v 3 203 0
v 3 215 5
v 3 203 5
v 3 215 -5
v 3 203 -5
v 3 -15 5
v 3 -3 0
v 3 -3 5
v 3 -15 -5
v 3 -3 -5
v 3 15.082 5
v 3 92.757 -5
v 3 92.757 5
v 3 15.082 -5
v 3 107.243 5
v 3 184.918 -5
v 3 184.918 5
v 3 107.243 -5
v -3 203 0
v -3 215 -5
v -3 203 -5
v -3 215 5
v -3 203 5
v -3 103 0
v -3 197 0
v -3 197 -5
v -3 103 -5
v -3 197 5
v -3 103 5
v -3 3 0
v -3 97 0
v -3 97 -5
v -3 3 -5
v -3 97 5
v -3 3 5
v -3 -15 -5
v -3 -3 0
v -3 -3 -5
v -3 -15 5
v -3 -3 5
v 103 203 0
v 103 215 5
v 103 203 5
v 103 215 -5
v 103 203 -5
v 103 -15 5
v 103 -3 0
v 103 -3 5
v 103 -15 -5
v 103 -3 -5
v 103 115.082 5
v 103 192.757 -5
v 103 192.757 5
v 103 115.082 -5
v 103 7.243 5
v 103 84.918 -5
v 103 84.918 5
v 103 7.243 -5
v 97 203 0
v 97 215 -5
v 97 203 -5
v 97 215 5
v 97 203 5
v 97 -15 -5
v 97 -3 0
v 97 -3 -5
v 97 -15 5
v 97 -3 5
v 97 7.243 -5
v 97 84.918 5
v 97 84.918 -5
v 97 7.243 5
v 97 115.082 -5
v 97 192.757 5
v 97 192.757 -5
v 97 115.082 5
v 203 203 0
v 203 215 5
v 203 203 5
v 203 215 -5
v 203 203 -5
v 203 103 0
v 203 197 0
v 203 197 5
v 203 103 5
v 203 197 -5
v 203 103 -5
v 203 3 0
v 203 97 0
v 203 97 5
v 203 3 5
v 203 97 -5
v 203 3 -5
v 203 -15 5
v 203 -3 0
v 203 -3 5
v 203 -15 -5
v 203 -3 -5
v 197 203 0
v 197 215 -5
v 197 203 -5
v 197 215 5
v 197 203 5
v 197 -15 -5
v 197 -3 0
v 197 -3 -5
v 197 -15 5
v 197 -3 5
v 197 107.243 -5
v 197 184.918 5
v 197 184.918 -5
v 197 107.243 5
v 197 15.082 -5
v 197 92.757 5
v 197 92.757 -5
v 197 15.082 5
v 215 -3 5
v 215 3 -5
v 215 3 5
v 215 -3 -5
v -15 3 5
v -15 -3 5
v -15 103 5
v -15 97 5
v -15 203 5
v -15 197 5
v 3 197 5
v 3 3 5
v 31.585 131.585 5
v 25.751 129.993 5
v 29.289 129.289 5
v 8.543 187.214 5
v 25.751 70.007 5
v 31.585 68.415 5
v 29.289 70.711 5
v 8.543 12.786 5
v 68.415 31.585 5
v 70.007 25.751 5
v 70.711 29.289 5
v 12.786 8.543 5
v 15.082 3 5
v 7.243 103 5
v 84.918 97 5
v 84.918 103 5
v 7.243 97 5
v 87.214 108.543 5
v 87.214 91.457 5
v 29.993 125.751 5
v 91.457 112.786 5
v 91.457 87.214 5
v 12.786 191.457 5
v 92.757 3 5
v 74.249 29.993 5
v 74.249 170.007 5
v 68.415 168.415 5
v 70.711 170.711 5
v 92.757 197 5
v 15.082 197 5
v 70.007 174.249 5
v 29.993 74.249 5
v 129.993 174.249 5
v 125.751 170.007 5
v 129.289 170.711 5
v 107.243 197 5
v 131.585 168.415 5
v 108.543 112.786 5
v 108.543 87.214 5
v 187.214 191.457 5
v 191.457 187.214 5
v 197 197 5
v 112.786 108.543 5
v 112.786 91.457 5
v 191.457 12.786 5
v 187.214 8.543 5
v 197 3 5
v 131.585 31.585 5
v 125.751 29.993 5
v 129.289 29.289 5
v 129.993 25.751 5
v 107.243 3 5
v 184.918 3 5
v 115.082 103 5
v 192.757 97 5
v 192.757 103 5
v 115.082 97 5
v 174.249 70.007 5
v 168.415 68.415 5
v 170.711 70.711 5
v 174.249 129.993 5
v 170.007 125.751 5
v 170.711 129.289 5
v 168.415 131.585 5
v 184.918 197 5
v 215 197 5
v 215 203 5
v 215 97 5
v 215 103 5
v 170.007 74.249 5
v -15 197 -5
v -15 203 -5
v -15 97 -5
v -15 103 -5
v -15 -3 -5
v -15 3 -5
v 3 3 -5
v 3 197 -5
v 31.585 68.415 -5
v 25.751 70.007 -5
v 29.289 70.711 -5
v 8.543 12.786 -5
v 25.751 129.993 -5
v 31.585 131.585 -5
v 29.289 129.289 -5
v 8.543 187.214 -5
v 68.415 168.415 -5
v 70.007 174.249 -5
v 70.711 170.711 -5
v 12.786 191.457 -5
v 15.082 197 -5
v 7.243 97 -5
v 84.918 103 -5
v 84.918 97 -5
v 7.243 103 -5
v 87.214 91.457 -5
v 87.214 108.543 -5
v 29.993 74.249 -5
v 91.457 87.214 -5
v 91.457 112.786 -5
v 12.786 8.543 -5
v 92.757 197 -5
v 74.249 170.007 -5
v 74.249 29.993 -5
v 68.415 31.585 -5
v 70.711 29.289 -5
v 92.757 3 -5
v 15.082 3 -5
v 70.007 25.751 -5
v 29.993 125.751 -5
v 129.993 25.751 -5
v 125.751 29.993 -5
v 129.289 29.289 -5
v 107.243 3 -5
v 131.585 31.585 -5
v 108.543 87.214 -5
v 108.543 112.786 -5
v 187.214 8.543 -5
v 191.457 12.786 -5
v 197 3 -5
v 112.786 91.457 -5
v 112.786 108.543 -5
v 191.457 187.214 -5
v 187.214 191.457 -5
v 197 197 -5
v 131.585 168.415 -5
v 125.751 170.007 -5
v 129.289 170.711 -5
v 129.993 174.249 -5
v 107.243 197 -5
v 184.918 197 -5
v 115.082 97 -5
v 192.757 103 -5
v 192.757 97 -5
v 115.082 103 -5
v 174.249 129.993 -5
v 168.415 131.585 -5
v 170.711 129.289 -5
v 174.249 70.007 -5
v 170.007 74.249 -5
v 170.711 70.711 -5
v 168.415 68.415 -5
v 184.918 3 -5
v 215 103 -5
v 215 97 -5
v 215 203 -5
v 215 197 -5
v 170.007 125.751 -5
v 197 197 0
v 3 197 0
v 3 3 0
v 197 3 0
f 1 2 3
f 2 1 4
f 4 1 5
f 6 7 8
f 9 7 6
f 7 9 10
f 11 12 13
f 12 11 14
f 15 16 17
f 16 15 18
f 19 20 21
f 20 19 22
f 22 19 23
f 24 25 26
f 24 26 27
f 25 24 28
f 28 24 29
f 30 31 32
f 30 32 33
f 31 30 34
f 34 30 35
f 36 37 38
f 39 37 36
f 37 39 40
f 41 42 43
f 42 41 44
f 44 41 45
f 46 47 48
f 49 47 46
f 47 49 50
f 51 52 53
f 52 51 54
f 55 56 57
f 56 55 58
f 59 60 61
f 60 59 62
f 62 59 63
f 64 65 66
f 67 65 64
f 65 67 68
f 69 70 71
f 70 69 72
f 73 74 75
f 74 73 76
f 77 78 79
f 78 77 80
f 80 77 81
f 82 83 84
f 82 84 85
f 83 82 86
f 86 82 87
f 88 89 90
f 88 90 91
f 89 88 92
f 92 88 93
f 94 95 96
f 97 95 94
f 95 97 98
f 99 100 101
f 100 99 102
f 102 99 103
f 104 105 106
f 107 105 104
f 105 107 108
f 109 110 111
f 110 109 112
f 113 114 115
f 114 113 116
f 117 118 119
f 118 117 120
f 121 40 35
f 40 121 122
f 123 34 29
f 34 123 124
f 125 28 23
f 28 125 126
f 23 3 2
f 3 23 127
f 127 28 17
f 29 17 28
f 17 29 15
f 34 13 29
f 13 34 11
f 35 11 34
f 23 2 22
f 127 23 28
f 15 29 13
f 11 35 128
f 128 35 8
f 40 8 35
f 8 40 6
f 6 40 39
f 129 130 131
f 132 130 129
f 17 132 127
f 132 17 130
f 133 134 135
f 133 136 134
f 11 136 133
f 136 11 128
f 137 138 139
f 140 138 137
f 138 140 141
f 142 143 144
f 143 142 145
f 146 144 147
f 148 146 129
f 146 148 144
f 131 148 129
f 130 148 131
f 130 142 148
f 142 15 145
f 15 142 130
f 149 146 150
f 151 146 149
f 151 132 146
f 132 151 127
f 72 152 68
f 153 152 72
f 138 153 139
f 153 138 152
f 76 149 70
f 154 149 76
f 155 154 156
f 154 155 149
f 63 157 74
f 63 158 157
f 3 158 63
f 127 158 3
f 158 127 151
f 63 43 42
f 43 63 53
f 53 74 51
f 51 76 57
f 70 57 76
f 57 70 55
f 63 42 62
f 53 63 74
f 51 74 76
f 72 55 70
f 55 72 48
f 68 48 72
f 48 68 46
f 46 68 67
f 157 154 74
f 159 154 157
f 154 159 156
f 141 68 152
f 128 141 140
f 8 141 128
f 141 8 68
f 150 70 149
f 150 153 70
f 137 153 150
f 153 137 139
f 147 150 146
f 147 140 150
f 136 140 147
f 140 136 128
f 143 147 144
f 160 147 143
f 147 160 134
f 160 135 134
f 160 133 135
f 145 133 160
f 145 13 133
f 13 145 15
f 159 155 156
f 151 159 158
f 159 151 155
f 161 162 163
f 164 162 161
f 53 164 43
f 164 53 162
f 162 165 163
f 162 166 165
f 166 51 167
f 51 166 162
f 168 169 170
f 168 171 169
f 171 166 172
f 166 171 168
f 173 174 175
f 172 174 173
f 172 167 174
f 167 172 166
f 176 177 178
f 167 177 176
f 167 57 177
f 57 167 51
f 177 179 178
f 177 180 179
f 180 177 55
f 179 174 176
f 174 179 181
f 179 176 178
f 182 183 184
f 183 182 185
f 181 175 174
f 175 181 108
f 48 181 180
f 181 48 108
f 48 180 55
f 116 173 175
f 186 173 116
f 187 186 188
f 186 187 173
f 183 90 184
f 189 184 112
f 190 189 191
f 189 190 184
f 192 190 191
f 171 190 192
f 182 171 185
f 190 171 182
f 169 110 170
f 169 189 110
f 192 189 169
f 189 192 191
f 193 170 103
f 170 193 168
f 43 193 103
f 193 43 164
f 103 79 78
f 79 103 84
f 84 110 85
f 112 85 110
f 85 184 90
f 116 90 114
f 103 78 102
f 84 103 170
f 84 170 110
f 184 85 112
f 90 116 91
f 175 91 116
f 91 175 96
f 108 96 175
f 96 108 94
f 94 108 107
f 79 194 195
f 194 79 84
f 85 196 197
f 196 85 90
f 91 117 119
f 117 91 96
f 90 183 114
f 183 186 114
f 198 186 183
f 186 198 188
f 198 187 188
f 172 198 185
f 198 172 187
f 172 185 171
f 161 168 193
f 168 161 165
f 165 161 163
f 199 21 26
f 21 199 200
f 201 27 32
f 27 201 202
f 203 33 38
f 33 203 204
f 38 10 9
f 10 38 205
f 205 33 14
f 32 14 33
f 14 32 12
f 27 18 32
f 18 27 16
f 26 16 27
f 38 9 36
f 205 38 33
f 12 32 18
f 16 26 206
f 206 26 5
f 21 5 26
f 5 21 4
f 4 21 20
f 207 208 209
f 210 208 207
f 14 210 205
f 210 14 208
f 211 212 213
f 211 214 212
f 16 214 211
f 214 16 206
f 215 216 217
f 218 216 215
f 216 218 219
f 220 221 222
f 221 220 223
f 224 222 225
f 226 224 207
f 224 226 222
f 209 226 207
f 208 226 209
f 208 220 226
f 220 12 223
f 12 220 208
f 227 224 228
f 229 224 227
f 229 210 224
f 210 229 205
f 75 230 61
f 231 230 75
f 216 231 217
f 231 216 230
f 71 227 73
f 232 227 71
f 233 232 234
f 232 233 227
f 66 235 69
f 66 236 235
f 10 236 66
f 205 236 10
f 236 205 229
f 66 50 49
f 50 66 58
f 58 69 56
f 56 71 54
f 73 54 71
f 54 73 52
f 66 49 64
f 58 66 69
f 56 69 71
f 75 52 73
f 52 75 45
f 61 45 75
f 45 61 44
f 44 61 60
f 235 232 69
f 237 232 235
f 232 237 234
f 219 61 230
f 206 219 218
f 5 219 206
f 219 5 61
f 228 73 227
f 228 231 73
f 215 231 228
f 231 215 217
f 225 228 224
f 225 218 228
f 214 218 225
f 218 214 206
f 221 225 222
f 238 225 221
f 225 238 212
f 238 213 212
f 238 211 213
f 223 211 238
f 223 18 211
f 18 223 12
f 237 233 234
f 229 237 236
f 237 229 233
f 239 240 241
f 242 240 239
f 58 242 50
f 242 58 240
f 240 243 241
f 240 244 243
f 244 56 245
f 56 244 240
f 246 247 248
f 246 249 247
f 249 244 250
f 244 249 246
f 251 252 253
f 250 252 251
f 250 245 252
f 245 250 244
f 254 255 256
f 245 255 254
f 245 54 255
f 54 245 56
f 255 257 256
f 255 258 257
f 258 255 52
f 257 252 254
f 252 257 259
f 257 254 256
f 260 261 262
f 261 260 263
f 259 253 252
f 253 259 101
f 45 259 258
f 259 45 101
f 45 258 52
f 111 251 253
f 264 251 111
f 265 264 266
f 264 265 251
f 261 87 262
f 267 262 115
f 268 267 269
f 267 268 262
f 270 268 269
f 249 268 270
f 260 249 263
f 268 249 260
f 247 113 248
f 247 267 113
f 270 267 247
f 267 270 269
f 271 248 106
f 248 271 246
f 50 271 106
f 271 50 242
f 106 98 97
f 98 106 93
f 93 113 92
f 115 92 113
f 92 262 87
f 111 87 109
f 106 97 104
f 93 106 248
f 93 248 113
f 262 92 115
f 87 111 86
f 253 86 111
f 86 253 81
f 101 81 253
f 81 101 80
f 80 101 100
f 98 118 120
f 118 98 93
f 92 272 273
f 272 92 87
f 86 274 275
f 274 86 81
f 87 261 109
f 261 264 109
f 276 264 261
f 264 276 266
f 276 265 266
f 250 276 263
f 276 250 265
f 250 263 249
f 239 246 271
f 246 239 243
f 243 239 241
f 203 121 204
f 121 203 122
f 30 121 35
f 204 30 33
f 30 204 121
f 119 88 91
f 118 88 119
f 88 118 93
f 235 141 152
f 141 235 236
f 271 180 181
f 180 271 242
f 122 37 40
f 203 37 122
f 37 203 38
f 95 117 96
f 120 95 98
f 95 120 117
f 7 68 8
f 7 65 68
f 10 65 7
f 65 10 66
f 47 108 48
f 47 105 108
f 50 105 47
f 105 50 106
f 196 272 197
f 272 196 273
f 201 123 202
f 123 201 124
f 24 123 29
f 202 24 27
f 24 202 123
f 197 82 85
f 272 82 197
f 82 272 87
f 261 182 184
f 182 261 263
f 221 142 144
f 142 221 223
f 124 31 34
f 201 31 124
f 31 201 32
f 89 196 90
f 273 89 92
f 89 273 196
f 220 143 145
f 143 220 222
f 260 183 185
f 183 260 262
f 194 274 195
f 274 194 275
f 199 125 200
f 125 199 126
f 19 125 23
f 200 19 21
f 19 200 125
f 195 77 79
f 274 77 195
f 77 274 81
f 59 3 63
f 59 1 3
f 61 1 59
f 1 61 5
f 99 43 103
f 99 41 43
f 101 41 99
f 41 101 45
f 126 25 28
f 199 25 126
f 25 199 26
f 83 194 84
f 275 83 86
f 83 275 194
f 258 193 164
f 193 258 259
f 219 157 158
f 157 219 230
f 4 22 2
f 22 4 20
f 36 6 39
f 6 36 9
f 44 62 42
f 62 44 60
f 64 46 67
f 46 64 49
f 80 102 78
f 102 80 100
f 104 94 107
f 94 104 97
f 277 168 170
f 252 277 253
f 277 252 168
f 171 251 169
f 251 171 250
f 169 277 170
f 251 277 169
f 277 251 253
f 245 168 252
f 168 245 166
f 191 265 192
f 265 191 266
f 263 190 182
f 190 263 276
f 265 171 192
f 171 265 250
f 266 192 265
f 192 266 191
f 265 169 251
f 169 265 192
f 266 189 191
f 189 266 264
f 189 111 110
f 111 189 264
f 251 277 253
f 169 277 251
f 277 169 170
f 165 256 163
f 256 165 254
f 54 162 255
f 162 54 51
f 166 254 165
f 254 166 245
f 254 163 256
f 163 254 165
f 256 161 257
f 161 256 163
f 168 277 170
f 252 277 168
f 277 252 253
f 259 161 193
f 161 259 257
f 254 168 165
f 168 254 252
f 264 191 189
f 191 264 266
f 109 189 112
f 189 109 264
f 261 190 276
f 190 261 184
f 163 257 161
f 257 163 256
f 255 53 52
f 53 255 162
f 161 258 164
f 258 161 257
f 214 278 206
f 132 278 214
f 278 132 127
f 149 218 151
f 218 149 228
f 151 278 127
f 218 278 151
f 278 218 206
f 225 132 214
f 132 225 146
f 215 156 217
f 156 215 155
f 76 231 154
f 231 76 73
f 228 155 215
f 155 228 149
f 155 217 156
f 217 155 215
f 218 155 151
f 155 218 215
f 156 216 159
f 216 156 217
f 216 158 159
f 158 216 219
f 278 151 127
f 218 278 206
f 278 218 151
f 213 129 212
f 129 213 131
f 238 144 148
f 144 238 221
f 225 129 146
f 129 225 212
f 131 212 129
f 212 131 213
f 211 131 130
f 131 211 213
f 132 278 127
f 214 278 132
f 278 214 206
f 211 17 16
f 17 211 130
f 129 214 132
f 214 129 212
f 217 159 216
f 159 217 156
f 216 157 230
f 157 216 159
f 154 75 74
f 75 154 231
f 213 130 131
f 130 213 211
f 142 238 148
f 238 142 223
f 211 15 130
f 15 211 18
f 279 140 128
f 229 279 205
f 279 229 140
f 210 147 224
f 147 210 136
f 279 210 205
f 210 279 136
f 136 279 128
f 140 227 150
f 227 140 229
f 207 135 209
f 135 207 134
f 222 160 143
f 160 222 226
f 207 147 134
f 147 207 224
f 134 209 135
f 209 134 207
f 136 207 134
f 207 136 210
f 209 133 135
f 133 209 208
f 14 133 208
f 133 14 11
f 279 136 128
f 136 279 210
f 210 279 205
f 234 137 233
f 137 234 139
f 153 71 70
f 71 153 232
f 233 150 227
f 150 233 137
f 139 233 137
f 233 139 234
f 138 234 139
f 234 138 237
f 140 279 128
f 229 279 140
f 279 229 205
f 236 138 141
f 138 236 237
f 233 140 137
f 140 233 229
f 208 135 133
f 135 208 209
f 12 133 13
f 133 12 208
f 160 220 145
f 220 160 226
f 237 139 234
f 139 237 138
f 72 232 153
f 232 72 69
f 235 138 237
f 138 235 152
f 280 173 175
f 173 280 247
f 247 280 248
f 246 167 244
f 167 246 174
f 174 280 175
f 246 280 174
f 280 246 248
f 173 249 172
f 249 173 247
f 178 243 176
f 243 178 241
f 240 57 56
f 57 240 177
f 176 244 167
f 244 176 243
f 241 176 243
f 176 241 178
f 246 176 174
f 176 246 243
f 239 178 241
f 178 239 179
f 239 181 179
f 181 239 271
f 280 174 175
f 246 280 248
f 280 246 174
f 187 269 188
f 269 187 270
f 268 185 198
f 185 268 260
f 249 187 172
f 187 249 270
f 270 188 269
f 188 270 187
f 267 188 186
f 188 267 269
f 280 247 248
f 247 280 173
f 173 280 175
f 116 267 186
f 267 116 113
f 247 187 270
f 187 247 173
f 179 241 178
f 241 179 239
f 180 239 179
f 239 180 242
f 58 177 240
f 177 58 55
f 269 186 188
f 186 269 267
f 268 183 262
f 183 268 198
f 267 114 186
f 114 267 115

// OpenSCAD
$l = 100;
$s = 6;
$h = 10;
$fn=30;
$extrude = true;
$colorit = true;

function measure(x) = sqrt(x*x);

module kolor(c) {
  if ($colorit) {
    color(c) children();
  } else {
    children();
  }
}

module maybe_extrude() {
  if ($extrude) {
    linear_extrude($h, center=true) {
      children();
    }
  } else {
    children();
  }
}

// Debugging, put a little dot at (x1, y1) offset by o
module _pp(p) {
  //  translate([x1 - cos(atan(l1) + 90)*o/2,
  //             y1 - sin(atan(l1) + 90)*o/2 ])
  echo(p);
  translate(p)
    color("black")circle(r=1);
}

module framer(n=1) {
  difference() {
    translate([-5/2 * $s, -1/2 * $s, -1/2 * $h]) {
      cube([n * $l + 5 * $s, $s, $h]);
    }
    for (i = [0 : n]) {
      translate([-1/2 * $s + i * $l, -1/2 * $s - .01, 0]) {
        cube([$s, $s + .02, 1/2 * $h + .01 ]);
      }
    }
  }
}

module frame(nx, ny) {
  for (j = [0 : ny]) {
    translate([0, j * $l, 0]) {
      kolor([.8, .8, .8]) {
        framer(nx);
      }
    }
  }
  for (i = [0 : nx]) {
    translate([i * $l, 0, 0]) {
      rotate(90) {
        scale([1, 1, -1]) {
          kolor([.9, .9, .9]) {
            framer(ny);
          }
        }
      }
    }
  }
}

// Where does the line passing through (x1, y1) with slope tan(a1)
// intersect the line passing through (x2, y2) with slope tan(a2)?
//
// The equation of a  line through x0, y0 with slope λ0 = tan(a0) is
//
// (Y - y0) / (X - x0) = λ0  ................................... [1]
//
// equivalently:
//
// Y = λ0 * (X - x0) + y0    ................................... [2]
//
//
// equivalently
//
// X = x0 + (Y - y0) / λ0    ................................... [3]


// The two lines intersect at:
//
// λ1 * (X - x1) + y1 = λ2 * (X - x2) + y2
//
// => λ1 * X - λ1 * x1 + y1 = λ2 * X - λ2 * x2 + y2
//
// => λ1 * X - λ2 * X = λ1 * x1 - y1 - λ2 * x2 + y2
//
// => (λ1 - λ2) * X = (λ1 * x1  - λ2 * x2) - (y1 - y2)
//
//
// X = ((λ1 * x1  - λ2 * x2) - (y1 - y2)) / (λ1 - λ2) .........  [4]
//
//
// Prettier:
//
//          (λ1 * x1  - λ2 * x2) - (y1 - y2)
//    X = ------------------------------------
//                      (λ1 - λ2)
//
//
// We can derive Y two ways:
//
// Substituting X from [4] into [2] for either line,
// or more elegantly by using [3]:
//
// x1 + (Y - y1) / λ1 = x2 + (Y - y2) / λ2
//
// => λ1 * λ2 * x1 + λ2 * Y - λ2 * y1 = λ2 * λ1 * x2 + λ1 * Y - λ1 * y2
//
// =>  λ1 * Y -  λ2 * Y = λ1 * λ2 * x1 -  λ1 * λ2 * x2 + λ2 * y1  - λ1 * y2
//
// => Y = (λ1 * λ2 * (x1 - x2) + λ1 * y2  - λ2 * y1) / (λ1 - λ2) .. [5]
//
//
// Prettier
//
//          λ1 * λ2 * (x1 - x2) + λ1 * y2  - λ2 * y1
//    Y = --------------------------------------------
//                       (λ1 - λ2)
//
//
//
// If line1 is vertical, intersection is at [x1, y2 - (x2 - x1) * λ2]
// If line2 is vertical, intersection is at [x2, y1 - (x1 - x2) * λ1]

function intersect_lines(x1, y1, a1, x2, y2, a2) =
  (abs(a1) == 90) ? [x1, y2 - (x2 - x1) * tan(a2)] :  // line1 is vertical
  (abs(a2) == 90) ? [x2, y1 - (x1 - x2) * tan(a1)] :  // line2 is vertical
                    [
                     ((tan(a1) * x1  - tan(a2) * x2) - (y1 - y2)) / (tan(a1) - tan(a2)),
                     (tan(a1) * tan(a2) * (x1 - x2) + tan(a1) * y2 - tan(a2) * y1) / (tan(a1) - tan(a2))
                     ];


// Our "lines" have thickness, so we need to intersect where the shifted
// lines meet
function intersect_lines_offset(x1, y1, a1, x2, y2, a2, o1, o2) =
  intersect_lines(x1 - cos(a1 + 90) * o1 / 2,
                  y1 - sin(a1 + 90) * o1 / 2,
                  a1,
                  x2 - cos(a2 + 90) * o2 / 2,
                  y2 - sin(a2 + 90) * o2 / 2,
                  a2);

function flip(x) = [x[1], x[0]];

//
//
//
//      Y                            xxxxxx
//      Y                             P
//      Y                           P  q
//      Y                         P   q
//      Y                       P    q
//      Y                     P     q
//      Y                   P      q
//      Y                 P       q
//      Y               P        q
//      Y             P         q
//      Y           P          Q
//      Y         P        Q    R
//      Y       P      Q          R
//      Y     P    Q                R   y
//      Y   P  Q                     R  y
//      Y PQ                           Ry
//       XXXXXXXXXXXXXXXXXXXXXXXXXXXXXXXXXXXXXXXXXXXXX
//
//
// X: (0, 0), 0°
// Y: (0, 0), 90°
// x: (l, l), 0°
// y: (l, 0), 90°
// P: (0, 0), 45°
// Q: (0, 0), 22.5°
// q: (l, l), -135° + 22.5°
// R: (l, 0), 135°


module quad(which="nothing") {
  LLx = 0;
  LLy = 0;
  LL  = [LLx, LLy];
  LL3 = [LLx, LLy, 0];
  LRx = $l;
  LRy = 0;
  LR  = [LRx, LRy];
  LR3 = [LRx, LRy, 0];
  ULx = 0;
  ULy = $l;
  UL = [ULx, ULy];
  UL3= [ULx, ULy, 0];
  URx = $l;
  URy = $l;
  UR  = [URx, URy];
  UR3 = [URx, URy, 0];

// Use symmetry where possible


  p0 = [$s / 2, $s / 2];
  p1 = intersect_lines_offset(LLx, LLy, 45, LLx, LLy, 22.5, $s, -$s);
  p2 = UR - flip(p1);
  p3 = UR - p0;
  p4 = flip(p2);
  p5 = flip(p1);

  module p() {
    maybe_extrude() {
      polygon(points=[p0, p1, p2, p3, p4, p5]);
    }
  }

  q0 = p0;
  q1 = intersect_lines_offset(LLx, LLy, 22.5, LLx, LLy, 0, $s, -$s);
  q2 = intersect_lines_offset(LLx, LLy, 22.5, LRx, LRy, 135, $s, -$s);
  q3 = intersect_lines_offset(LLx, LLy, 22.5, URx, URy, -135 + 22.5, 0, 0);
  q4 = intersect_lines_offset(LLx, LLy, 22.5, URx, URy, -135 + 22.5, -$s, $s);
  q5 = p1;

  module q() {
    maybe_extrude() {
      polygon(points=[q0, q1, q2, q3, q4, q5]);
    }
  }

  r0 = LR - [$s / 2, -$s / 2];
  r1 = intersect_lines_offset(LRx, LRy, 0, LRx, LRy, 135, -$s, -$s);
  r2 = q2;
  r3 = q3;
  r4 = UR - flip(r2);
  r5 = UR - flip(r1);

  module r() {
    maybe_extrude() {
      polygon(points=[r0, r1, r2, r3, r4, r5]);
    }
  }

  if (which == "p") {
    p();
  } else if (which == "q") {
    q();
  } else if (which == "r") {
    r();
  } else if (which == "qm") {
    mirror([1, -1]) q();
  } else {
    kolor("red") p();

    kolor("green") q();
    kolor("olive") translate(UR3) mirror([1, 1]) q();
    kolor("lime") translate(LL3) mirror([1, -1]) q();
    kolor("lightgreen") mirror([1, -1]) translate(UR3) mirror([1, 1]) q();

    kolor("blue") r();
    kolor("cyan") mirror([1, -1]) r();
  }
}



// Print 6 of this:
*framer(2);

// Print 4 of this:
*quad("p");

// Print 8 of each of these
*quad("q");
*quad("qm");
*quad("r");

// show
union() {
  x = 2;
  y = 2;

  frame(x, y);
  for (i = [1 : 2 : x], j = [1 : 2 : y]) {
    translate([$l * i, $l * j]) {
      for (a = [0 : 90 : 359]) {
        rotate(a) {
          quad();
        }
      }
    }
  }
}


module hex() {

  LLx = 0;
  LLy = 0;
  LL  = [LLx, LLy];
  LL3 = [LLx, LLy, 0];

  LRx = $l;
  LRy = 0;
  LR  = [LRx, LRy];
  LR3 = [LRx, LRy, 0];

  UUx = $l / 2;
  UUy = $l * sqrt(3) / 2;
  UU  = [UUx, UUy];
  UU3 = [UUx, UUy, 0];

  p0 = intersect_lines_offset(LLx, LLy, 0, LLx, LLy, 60, 0, 0);
  p1 = intersect_lines_offset(LLx, LLy, 0, LLx, LLy, 60, -$s, $s);
  p2 = [LRx - p1[0], p1[1]];
  p3 = LR;
  p4 = [p2[0], -p2[1]];
  p5 = [p1[0], -p1[1]];

  module p() {
    maybe_extrude() {
      polygon(points=[p0, p1, p2, p3, p4, p5]);
    }
  }

  module rota() {
    translate(LR) rotate(120) children();
  }

  module rotb() {
    translate(UU) rotate(240) children();
  }

  q0 = p1;
  q1 = intersect_lines_offset(LLx, LLy, 0, LLx, LLy, 30, -$s, $s);
  q2 = intersect_lines_offset(LLx, LLy, 30, LRx, LRy, 150, $s, -$s);
  q3 = intersect_lines_offset(LLx, LLy, 30, LRx, LRy, 150, 0, 0);
  q4 = intersect_lines_offset(LLx, LLy, 30, UUx, UUy, 90, -$s, -$s);
  q5 = intersect_lines_offset(LLx, LLy, 30, LLx, LLy, 60, -$s, $s);

  module q() {
    maybe_extrude() {
      polygon(points=[q0, q1, q2, q3, q4, q5]);
    }
  }

  f = LRx / 3;
  r0 = intersect_lines_offset(LLx, LLy, 0, f, LLy, 30, -$s, -$s);
  r1 = intersect_lines_offset(LLx, LLy, 0, f, LLy, 30, -$s, $s);
  r2 = intersect_lines_offset(LRx / 3, LLy, 30, LRx, LRy, 150, $s, -$s);
  r3 = intersect_lines_offset(LRx / 3, LLy, 30, LRx, LRy, 150, -$s, -$s);

  module x1() {
    if ($extrude) {
      difference() {
        linear_extrude($h, center=true) {
          polygon(points=[r0, r1, r2, r3]);
        }
        linear_extrude($h / 2) {
          translate(LR) {
            scale([-1, 1]) polygon(points=[r0, r1, r2, r3]);
          }
        }
      }
    } else {
      polygon(points=[r0, r1, r2, r3]);
    }
  }

  module x2() {
    translate(LR) {
      scale([-1, 1]) {
        x1();
      }
    }
  }

  module hexit() {
    kolor("red") p();
    kolor("pink") rota() p();
    kolor("orange") rotb() p();

    kolor("blue") q();
    kolor("cyan") rota() q();
    kolor("turquoise") rotb() q();

    kolor("green") x1();
    kolor("lime") rota() x1();
    kolor("olive") rotb() x1();
    x2();
    rota() x2();
    rotb() x2();
  }

  hexit();
}
